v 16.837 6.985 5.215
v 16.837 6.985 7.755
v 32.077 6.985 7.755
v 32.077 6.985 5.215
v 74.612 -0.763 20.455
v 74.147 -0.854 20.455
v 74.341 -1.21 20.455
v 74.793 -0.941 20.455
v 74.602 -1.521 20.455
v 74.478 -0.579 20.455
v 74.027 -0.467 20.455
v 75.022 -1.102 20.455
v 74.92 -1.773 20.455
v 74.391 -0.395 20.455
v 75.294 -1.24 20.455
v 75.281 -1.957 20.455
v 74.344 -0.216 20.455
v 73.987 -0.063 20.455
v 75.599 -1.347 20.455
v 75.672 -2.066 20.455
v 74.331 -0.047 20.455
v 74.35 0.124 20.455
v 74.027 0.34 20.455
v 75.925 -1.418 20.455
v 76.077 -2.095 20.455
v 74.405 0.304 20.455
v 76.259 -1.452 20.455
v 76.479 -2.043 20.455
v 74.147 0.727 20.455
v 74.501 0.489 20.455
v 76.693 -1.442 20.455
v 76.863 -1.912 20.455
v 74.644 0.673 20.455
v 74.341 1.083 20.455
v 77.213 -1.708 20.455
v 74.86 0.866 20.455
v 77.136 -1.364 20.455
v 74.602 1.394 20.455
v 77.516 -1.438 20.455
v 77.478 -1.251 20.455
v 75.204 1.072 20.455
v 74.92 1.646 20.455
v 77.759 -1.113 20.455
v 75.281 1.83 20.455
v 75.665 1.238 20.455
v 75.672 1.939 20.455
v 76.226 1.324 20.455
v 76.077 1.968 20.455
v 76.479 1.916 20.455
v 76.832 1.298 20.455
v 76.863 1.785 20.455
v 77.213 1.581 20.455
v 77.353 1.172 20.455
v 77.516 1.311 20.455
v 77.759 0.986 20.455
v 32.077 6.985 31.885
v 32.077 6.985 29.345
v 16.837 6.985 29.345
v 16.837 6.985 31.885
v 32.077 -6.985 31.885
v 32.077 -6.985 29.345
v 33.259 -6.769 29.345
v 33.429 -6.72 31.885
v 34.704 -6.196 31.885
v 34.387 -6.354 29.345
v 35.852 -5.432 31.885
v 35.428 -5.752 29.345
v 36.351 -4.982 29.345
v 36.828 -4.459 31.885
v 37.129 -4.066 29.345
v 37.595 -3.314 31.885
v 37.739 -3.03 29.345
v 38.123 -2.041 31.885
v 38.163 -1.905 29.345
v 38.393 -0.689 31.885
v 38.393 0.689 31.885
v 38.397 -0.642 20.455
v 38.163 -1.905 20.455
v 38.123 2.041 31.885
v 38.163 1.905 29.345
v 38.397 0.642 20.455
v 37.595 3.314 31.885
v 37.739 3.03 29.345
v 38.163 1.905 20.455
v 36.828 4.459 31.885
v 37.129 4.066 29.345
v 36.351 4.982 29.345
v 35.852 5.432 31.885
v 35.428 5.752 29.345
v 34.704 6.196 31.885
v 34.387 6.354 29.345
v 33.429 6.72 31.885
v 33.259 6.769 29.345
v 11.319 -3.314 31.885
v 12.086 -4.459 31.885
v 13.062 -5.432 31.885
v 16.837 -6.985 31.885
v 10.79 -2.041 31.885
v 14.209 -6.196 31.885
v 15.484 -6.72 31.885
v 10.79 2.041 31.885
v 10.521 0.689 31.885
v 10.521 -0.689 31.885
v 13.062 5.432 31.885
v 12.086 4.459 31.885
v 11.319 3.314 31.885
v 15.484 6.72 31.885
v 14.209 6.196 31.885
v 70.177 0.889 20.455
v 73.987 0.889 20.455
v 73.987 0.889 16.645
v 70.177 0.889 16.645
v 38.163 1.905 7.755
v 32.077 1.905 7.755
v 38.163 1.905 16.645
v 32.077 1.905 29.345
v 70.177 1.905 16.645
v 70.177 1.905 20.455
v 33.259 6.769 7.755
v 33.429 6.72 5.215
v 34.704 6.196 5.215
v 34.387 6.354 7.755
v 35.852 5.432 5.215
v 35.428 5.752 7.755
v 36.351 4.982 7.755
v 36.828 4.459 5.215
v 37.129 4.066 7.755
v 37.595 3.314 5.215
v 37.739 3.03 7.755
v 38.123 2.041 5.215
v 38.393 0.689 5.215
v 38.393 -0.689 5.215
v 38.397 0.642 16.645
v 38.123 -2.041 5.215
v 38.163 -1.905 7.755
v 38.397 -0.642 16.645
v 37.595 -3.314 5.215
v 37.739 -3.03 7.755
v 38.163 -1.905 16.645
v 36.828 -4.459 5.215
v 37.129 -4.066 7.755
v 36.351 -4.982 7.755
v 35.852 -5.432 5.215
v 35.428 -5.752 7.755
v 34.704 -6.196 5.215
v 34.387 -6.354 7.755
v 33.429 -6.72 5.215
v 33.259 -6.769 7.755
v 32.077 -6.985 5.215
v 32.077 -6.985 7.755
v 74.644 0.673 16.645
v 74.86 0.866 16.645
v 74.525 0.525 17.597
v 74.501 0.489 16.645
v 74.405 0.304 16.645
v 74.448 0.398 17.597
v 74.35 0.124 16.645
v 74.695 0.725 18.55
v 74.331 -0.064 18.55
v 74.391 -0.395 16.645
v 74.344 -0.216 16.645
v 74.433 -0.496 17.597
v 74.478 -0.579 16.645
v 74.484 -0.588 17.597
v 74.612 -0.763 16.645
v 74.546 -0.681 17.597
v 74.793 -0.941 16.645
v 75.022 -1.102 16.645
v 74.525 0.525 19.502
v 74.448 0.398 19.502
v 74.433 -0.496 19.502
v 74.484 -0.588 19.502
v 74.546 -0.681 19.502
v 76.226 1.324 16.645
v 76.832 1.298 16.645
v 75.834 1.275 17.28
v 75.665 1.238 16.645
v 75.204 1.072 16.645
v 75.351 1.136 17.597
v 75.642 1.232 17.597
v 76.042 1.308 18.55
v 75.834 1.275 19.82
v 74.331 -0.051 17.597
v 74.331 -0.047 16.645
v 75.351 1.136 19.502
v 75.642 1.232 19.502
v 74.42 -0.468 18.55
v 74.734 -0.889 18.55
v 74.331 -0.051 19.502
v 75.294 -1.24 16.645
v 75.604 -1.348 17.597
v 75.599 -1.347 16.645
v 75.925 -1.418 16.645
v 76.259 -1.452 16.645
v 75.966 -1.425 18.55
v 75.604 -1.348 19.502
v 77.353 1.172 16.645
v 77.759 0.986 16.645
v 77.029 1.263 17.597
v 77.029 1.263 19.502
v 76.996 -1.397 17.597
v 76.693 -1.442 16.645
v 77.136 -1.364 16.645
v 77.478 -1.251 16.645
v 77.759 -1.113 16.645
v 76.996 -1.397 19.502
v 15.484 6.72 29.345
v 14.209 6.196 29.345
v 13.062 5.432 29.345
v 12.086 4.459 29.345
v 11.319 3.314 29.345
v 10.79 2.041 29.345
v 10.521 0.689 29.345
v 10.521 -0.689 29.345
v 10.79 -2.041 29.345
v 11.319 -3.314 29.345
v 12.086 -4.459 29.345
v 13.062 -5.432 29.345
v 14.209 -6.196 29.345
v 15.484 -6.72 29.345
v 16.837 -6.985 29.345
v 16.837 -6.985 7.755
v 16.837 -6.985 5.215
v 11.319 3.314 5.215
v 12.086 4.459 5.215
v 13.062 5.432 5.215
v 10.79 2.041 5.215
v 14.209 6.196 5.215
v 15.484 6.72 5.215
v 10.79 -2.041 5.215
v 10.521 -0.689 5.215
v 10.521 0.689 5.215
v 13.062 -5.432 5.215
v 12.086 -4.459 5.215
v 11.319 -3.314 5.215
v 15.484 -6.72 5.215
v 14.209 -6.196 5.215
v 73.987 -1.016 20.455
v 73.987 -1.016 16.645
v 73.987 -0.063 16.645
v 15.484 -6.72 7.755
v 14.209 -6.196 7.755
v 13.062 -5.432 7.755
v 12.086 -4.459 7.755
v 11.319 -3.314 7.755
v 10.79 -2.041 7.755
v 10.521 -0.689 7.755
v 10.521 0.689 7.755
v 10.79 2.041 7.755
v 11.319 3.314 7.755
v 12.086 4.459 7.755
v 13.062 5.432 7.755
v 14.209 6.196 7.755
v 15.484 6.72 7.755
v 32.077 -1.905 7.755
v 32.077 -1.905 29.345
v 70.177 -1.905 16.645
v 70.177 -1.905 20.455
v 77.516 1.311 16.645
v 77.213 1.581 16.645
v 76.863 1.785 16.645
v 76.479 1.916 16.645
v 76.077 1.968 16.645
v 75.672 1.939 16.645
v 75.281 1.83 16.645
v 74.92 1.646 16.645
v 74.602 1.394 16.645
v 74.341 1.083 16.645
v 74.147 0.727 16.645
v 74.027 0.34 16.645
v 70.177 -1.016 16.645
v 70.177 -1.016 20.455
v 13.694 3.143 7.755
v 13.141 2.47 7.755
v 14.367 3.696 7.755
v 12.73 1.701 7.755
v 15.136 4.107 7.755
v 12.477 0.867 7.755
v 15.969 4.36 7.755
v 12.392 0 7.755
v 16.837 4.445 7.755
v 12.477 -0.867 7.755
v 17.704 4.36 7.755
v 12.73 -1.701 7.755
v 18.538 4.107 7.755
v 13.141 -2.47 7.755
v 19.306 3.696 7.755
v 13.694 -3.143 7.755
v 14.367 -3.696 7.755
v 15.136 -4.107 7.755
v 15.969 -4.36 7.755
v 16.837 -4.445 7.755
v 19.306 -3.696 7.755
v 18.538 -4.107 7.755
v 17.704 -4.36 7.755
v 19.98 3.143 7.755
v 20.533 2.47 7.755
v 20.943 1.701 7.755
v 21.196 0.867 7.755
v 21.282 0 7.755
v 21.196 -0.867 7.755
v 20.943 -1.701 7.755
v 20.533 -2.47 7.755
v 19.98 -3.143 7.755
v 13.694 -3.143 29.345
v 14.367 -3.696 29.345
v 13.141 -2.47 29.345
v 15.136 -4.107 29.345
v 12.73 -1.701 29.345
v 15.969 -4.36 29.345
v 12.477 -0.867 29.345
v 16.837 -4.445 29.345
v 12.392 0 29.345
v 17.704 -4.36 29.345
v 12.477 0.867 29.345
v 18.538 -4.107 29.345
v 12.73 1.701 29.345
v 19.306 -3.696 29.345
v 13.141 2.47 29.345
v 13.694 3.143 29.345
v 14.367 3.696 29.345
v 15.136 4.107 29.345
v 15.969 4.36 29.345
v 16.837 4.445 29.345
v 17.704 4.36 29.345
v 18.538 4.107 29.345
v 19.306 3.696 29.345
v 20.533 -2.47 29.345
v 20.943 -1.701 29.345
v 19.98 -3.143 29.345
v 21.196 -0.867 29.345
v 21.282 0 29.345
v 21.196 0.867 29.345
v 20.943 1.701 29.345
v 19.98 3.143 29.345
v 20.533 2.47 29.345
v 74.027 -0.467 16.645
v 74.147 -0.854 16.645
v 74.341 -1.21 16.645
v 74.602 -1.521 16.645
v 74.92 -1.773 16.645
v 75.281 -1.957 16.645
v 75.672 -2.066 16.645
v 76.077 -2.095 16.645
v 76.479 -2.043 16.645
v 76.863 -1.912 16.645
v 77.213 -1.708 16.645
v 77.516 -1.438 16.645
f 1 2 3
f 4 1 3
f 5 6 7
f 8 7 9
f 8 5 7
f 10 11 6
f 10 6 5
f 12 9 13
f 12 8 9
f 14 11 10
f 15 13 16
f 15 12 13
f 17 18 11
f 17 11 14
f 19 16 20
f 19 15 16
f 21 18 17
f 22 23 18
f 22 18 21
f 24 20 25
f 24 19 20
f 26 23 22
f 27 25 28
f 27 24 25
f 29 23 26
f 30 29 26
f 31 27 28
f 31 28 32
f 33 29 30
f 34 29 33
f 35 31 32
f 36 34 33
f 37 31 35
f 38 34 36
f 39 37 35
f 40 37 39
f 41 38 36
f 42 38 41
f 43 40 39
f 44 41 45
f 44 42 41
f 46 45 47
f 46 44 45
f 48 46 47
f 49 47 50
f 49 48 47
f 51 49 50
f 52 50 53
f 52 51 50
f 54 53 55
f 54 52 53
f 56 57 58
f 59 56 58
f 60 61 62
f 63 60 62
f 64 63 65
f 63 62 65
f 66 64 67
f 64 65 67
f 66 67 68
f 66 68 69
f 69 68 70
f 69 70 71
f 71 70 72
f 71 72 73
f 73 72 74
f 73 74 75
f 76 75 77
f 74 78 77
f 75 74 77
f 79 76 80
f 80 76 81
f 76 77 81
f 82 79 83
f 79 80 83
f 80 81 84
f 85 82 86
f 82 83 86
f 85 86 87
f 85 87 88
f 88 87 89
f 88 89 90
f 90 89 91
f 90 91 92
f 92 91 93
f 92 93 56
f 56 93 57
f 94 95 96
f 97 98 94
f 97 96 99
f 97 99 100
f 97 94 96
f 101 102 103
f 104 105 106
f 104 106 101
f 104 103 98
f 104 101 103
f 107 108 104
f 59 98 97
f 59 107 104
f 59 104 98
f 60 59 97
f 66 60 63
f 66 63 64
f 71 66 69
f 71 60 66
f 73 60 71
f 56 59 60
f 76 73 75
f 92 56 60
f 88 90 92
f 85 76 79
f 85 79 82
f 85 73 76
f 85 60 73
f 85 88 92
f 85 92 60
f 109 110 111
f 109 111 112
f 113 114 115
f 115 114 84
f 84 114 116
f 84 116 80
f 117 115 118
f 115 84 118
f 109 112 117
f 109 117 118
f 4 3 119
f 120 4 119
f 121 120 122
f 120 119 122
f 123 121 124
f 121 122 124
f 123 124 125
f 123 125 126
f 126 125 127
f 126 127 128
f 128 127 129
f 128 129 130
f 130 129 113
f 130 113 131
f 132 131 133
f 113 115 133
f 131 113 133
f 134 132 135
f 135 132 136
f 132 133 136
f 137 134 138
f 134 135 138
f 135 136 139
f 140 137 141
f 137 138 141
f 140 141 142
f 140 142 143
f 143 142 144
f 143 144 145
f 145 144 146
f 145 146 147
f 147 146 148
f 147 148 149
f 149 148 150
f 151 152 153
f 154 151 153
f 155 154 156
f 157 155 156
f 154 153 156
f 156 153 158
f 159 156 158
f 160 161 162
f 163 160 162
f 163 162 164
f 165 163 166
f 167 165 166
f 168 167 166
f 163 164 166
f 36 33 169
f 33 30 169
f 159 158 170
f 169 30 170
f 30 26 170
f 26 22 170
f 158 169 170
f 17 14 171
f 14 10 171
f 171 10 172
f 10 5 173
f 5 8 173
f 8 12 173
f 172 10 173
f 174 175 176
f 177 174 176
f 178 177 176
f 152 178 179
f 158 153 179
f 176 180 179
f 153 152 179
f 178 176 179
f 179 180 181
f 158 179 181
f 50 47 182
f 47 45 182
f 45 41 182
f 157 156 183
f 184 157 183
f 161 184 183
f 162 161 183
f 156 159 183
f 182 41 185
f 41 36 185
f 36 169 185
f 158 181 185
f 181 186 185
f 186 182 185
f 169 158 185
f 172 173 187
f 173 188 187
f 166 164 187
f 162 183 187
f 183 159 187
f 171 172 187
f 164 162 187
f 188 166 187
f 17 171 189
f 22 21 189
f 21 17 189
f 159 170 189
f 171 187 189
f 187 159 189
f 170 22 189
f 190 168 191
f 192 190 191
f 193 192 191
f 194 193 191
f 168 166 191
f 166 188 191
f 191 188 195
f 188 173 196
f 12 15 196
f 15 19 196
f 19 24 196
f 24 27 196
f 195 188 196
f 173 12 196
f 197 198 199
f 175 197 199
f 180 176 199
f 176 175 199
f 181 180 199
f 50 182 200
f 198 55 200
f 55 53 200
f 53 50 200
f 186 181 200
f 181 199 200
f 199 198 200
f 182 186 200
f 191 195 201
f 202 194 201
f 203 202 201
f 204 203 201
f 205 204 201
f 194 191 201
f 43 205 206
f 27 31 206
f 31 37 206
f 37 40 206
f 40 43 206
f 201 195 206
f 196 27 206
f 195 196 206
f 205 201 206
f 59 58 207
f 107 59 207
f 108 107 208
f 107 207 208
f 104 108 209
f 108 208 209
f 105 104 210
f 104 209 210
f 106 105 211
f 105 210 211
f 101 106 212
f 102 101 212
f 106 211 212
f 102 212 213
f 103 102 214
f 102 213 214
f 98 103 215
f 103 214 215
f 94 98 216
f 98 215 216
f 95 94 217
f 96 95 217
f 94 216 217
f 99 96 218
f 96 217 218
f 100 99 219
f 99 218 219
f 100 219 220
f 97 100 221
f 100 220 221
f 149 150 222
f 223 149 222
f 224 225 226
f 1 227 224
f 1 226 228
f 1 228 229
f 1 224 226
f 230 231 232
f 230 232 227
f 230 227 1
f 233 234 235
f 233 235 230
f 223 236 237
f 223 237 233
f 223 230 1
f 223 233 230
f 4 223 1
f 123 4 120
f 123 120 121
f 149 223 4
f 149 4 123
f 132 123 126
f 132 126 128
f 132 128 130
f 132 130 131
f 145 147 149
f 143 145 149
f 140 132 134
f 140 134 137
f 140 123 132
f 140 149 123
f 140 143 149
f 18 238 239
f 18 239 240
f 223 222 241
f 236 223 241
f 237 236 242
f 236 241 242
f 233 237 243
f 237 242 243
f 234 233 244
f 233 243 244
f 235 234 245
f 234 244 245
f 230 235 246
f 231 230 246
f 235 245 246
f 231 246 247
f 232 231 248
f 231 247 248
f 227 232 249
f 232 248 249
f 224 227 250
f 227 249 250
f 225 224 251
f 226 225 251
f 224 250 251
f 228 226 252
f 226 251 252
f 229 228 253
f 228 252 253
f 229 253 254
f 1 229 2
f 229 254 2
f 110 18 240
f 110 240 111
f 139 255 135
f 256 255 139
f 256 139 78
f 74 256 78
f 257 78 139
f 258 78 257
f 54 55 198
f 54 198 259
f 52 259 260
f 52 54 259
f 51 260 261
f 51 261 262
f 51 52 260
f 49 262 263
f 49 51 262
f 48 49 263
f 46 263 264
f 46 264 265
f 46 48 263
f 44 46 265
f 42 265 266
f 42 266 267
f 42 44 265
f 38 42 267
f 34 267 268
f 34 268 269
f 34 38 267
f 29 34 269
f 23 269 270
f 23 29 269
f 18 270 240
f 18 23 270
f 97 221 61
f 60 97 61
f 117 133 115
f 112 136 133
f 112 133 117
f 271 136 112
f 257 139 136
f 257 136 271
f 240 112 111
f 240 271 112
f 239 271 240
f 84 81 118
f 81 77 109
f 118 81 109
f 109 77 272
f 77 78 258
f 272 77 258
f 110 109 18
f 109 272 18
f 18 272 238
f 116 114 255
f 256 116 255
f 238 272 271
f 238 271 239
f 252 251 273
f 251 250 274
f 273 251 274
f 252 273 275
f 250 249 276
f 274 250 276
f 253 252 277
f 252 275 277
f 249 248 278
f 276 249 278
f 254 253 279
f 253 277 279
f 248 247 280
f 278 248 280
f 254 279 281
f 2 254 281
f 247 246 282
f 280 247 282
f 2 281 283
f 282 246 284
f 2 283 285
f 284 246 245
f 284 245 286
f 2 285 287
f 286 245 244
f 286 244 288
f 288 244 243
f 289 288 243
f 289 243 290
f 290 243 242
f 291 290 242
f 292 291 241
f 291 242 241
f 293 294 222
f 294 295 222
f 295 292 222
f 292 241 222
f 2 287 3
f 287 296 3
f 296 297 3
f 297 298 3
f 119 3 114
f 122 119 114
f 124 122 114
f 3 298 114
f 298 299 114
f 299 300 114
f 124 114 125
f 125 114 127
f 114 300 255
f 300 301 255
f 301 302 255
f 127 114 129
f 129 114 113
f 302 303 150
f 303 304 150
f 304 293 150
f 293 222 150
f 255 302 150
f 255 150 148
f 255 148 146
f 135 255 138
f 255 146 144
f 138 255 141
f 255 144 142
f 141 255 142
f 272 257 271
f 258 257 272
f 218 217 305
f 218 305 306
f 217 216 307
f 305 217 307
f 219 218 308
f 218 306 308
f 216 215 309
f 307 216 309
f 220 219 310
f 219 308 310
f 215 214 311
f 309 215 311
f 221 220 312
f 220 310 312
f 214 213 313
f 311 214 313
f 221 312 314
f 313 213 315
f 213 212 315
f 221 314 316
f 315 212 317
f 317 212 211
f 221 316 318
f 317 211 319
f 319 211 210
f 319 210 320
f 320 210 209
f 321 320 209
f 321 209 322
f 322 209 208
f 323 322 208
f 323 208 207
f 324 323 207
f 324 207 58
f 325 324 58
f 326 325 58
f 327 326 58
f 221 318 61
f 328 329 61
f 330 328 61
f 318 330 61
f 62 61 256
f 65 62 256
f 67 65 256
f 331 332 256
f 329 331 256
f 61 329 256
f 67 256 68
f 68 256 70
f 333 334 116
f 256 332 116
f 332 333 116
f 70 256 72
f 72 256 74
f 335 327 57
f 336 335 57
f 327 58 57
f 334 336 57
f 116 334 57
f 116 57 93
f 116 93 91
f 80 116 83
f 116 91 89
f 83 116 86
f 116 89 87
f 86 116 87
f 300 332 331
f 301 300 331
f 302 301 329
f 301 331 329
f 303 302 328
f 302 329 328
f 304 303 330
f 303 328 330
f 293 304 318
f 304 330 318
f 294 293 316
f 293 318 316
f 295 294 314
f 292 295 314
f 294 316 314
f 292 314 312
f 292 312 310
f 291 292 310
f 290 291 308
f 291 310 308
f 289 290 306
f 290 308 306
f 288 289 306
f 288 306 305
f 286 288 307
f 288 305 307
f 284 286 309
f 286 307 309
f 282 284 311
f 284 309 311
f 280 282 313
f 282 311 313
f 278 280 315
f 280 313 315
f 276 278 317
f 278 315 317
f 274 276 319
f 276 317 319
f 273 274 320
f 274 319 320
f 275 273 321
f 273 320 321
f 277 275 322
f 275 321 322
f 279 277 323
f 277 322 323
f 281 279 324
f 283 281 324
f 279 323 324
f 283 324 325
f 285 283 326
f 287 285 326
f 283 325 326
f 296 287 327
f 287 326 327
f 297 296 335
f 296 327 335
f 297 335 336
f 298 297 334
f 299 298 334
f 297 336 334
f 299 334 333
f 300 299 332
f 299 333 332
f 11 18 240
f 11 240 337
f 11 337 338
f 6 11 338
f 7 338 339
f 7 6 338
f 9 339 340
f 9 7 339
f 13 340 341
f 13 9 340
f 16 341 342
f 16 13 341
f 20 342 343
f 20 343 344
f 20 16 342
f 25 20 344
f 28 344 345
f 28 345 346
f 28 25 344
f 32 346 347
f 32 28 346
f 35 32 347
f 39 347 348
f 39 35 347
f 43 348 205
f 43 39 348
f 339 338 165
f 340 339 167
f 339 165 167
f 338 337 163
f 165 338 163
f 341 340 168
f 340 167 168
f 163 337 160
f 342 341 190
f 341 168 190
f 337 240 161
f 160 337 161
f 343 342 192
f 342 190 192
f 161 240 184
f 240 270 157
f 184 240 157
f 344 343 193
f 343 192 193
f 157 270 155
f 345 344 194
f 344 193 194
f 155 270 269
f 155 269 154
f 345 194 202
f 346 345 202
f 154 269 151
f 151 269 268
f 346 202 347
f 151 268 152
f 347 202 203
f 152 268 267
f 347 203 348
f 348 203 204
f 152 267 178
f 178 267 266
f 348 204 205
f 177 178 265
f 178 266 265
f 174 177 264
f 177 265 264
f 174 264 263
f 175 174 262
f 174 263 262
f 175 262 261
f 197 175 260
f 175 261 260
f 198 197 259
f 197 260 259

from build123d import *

# Parameters (mm, degrees)
F0_W      = 38.1
F0_H      = 3.81
F1_DEPTH  = 1.905
F3_DEPTH  = 11.43
F5_DEPTH  = 11.43
F6_DEPTH  = 8.89
F7_DEPTH  = 8.89
F8_R      = 4.445
F9_DEPTH  = 21.59
F11_DEPTH = 3.81


with BuildPart() as f1:
    # F0 (on Front) → F1 (new body, symmetric)
    with BuildSketch(Plane.XZ):
        with Locations((51.1266756803, 18.5499984162)):
            Rectangle(F0_W, F0_H)
    extrude(amount=F1_DEPTH, both=True)

    # F2 (on face) → F3 (join)
    with BuildSketch(Plane.XY.offset(20.4549984162)):
        with BuildLine():
            Line((16.8366756803, -6.985), (32.0766756803, -6.985))
            ThreePointArc((32.0766756803, -6.985), (38.4266756803, 0), (32.0766756803, 6.985))
            Line((32.0766756803, 6.985), (16.8366756803, 6.985))
            ThreePointArc((16.8366756803, 6.985), (10.4866756803, 0), (16.8366756803, -6.985))
        make_face()
    extrude(amount=F3_DEPTH)

    # F4 (on face) → F5 (join)
    with BuildSketch(Plane(origin=(0, 0, 16.6449984162), x_dir=(1, 0, 0), z_dir=(0, 0, -1))):
        with BuildLine():
            ThreePointArc((32.0766756803, -6.985), (38.4266756803, 0), (32.0766756803, 6.985))
            Line((32.0766756803, 6.985), (16.8366756803, 6.985))
            ThreePointArc((16.8366756803, 6.985), (10.4866756803, 0), (16.8366756803, -6.985))
            Line((16.8366756803, -6.985), (32.0766756803, -6.985))
        make_face()
    extrude(amount=F5_DEPTH)

    # F6 (cut): a face of the model
    f6_faces = [f1.faces().sort_by_distance(p)[0] for p in [
        (23.6673527755, 0, 20.4549984162),
    ]]
    extrude(f6_faces, amount=-F6_DEPTH, mode=Mode.SUBTRACT)

    # F7 (cut): a face of the model
    f7_faces = [f1.faces().sort_by_distance(p)[0] for p in [
        (23.6673527755, 0, 16.6449984162),
    ]]
    extrude(f7_faces, amount=-F7_DEPTH, mode=Mode.SUBTRACT)

    # F8 (on face) → F9 (join, through all)
    with BuildSketch(Plane(origin=(0, 0, 29.3449984162), x_dir=(1, 0, 0), z_dir=(0, 0, -1))):
        with Locations((16.8366756803, 0)):
            Circle(F8_R)
    extrude(amount=F9_DEPTH)

    # F10 (on face) → F11 (join)
    with BuildSketch(Plane.XY.offset(20.4549984162)):
        Polygon((70.1766756803, 0.889), (70.1766756803, -1.016), (73.9866756803, -1.016), (73.9866756803, -0.0634999731), (73.9866756803, 0.889), align=None)
    extrude(amount=-F11_DEPTH)

    # F10 (on face) → F11, piece 2 (join)
    with BuildSketch(Plane.XY.offset(20.4549984162)):
        with BuildLine():
            ThreePointArc((77.7586875264, 0.9859678533), (75.4740106913, 1.8941424724), (73.9866756803, -0.0634999731))
            ThreePointArc((73.9866756803, -0.0634999731), (75.4740106654, -2.0211424652), (77.7586875264, -1.1129678533))
            add(Edge.make_bspline(
                [(74.3311792612, -0.0635), (74.3311792612, -3.1232148683), (77.7586875264, -1.1129678533)],
                knots=[0, 0, 0, 2.2876350152, 2.2876350152, 2.2876350152], degree=2, weights=[1, 0.4141227542, 1]))
            add(Edge.make_bspline(
                [(77.7586875264, 0.9859678533), (74.3311792612, 2.9962148683), (74.3311792612, -0.0635)],
                knots=[3.995550292, 3.995550292, 3.995550292, 6.2831853072, 6.2831853072, 6.2831853072], degree=2, weights=[1, 0.4141227542, 1]))
        make_face()
    extrude(amount=-F11_DEPTH)


solid = f1.part
